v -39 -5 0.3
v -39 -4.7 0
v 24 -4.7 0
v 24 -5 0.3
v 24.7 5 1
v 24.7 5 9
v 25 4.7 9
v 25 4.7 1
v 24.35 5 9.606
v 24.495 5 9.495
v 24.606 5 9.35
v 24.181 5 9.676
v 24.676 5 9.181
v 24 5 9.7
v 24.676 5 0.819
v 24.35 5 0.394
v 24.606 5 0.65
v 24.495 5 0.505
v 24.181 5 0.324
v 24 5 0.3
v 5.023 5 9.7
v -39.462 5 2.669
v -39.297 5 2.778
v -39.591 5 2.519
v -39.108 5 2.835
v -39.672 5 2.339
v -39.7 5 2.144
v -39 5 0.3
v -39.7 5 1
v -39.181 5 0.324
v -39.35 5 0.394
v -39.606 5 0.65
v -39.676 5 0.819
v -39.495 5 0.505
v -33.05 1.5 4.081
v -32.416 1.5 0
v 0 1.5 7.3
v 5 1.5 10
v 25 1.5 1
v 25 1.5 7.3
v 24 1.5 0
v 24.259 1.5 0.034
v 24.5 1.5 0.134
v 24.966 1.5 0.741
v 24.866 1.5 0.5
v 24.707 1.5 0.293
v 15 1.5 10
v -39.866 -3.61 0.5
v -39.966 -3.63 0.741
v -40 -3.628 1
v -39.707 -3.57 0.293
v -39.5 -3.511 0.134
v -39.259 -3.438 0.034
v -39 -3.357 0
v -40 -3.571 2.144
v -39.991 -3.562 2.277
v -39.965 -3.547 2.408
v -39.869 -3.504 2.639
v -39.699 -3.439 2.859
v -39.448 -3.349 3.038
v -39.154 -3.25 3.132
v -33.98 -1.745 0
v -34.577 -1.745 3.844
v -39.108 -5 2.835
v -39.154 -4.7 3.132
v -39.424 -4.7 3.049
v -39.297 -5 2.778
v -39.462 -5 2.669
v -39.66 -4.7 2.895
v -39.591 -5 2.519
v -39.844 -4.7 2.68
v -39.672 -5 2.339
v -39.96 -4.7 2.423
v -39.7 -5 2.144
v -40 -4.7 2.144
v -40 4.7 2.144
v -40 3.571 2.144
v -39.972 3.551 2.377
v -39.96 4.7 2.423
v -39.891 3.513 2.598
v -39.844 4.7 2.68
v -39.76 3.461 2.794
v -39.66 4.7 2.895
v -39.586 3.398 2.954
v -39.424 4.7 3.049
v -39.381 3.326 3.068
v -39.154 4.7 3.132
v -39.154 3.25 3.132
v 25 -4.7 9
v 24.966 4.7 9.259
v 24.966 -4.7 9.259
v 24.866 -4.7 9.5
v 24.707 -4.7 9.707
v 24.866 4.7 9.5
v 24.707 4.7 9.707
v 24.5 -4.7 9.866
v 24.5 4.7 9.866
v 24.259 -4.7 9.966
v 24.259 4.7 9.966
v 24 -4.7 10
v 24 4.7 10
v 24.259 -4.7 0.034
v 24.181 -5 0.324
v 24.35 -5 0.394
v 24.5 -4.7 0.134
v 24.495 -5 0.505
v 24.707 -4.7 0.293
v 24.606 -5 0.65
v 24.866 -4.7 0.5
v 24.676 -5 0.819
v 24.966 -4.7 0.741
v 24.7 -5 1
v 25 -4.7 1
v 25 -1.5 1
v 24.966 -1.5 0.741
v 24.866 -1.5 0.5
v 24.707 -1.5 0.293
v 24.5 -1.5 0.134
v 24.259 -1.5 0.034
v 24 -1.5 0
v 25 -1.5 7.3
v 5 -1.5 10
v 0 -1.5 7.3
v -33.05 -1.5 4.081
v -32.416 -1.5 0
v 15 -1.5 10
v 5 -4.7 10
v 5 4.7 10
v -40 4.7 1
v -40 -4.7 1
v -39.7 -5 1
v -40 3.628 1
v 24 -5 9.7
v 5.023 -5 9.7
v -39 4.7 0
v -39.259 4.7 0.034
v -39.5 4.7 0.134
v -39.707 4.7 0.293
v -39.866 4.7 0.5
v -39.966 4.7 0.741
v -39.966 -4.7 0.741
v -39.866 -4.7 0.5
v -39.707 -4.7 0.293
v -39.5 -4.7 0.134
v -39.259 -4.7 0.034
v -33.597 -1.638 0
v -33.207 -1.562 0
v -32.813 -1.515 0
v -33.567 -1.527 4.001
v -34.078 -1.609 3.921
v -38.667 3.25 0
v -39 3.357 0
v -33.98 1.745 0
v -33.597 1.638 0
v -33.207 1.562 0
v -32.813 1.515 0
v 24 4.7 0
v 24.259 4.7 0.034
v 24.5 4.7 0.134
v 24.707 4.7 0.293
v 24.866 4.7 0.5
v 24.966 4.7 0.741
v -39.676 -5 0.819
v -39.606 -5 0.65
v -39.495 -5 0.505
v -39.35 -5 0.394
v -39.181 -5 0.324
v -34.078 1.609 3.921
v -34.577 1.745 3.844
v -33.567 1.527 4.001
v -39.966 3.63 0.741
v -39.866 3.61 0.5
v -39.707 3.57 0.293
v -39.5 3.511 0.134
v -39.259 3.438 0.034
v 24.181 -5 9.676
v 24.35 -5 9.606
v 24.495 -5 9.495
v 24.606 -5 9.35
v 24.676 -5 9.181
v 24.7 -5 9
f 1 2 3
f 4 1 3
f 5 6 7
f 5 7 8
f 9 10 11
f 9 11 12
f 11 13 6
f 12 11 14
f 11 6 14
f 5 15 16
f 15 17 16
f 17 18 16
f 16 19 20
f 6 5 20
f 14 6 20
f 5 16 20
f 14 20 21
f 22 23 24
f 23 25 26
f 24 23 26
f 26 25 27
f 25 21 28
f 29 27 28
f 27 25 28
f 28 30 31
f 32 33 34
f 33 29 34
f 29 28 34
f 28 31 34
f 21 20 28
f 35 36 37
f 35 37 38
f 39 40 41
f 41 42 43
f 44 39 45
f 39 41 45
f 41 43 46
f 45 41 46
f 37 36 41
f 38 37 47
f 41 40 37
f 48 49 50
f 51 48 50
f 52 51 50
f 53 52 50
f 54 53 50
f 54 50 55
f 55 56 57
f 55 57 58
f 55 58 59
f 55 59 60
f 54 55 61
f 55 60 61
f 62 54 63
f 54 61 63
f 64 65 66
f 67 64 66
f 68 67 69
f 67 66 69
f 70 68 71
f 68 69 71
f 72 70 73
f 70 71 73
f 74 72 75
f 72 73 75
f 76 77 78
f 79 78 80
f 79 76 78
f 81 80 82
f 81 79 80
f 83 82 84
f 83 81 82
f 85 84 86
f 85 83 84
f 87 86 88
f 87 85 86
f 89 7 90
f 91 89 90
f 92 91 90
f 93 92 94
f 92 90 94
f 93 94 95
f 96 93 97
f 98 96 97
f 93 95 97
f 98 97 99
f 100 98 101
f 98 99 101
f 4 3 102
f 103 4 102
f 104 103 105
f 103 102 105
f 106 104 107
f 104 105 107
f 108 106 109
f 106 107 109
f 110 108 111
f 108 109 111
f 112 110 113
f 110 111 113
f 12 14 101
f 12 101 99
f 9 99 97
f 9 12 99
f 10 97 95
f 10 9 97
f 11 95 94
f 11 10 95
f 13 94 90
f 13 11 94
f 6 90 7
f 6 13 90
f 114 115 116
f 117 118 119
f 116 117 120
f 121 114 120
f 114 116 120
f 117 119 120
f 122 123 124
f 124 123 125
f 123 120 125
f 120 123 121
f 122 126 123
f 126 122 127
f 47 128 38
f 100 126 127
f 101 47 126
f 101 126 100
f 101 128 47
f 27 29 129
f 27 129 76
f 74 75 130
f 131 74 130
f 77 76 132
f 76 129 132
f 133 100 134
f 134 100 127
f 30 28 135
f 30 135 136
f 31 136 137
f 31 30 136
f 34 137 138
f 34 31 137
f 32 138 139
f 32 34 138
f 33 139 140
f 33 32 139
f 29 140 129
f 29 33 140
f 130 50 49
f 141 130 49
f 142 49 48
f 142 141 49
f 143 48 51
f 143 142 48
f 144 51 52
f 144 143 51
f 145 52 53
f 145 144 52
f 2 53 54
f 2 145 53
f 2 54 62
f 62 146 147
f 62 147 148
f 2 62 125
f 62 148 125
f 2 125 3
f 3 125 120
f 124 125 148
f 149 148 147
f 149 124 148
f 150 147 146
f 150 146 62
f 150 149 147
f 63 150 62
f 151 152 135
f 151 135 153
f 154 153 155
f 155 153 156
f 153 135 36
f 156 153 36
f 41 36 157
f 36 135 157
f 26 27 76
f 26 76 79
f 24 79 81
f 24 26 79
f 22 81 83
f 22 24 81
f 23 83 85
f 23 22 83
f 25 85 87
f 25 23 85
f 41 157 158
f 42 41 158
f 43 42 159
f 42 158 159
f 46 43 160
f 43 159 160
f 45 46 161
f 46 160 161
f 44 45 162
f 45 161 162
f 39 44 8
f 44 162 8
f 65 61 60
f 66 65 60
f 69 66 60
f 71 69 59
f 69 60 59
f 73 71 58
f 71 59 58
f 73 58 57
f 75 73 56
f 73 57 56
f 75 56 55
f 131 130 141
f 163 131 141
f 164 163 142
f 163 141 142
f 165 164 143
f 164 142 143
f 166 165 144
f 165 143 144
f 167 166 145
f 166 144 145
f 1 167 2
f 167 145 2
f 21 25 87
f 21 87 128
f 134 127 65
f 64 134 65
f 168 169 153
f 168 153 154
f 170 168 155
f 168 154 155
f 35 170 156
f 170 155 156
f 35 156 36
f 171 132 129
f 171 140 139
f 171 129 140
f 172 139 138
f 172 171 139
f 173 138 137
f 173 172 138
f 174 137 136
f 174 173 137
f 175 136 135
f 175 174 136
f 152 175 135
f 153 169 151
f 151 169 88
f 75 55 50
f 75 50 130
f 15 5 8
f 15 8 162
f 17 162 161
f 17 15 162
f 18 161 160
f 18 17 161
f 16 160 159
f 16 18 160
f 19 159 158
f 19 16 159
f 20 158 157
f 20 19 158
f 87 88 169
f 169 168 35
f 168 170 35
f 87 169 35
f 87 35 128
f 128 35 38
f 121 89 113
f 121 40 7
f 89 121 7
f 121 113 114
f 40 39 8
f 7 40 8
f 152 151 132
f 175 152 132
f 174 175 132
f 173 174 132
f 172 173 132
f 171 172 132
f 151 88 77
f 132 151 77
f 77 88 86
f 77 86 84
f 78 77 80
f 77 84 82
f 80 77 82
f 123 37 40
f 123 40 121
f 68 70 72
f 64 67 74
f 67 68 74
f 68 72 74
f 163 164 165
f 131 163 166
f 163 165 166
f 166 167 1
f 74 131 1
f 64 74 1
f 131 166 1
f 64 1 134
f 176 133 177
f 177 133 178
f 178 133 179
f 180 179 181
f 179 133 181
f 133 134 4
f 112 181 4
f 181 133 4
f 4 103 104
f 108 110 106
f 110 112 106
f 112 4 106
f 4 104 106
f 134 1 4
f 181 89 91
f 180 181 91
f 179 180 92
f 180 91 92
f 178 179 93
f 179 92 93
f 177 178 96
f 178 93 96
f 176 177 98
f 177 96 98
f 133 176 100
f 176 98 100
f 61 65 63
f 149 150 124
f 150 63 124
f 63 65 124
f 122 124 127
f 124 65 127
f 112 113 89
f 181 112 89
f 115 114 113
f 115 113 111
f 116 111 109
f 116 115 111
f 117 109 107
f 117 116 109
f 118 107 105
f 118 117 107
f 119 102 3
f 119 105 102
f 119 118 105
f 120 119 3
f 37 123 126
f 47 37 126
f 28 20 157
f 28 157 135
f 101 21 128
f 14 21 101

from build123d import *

# Parameters (mm, degrees)
F1_DEPTH  = 10
F2_W      = 3
F2_H      = 7.3
F3_DEPTH  = 25.001
F5_DEPTH  = 10.001
F6_R      = 1
F8_DEPTH  = 1.5
F10_DEPTH = 25
F11_R     = 5
F12_SIZE  = 0.3


with BuildPart() as f1:
    # F0 (on Top) → F1 (new body)
    with BuildSketch(Plane.XY):
        Polygon((-40, 5), (-40, 1.5), (0, 1.5), (0, 0), (0, -1.5), (-40, -1.5), (-40, -5), (25, -5), (25, 0), (25, 5), align=None)
    extrude(amount=F1_DEPTH)

    # F2 (on face) → F3 (cut, through all)
    with BuildSketch(Plane(origin=(0, 0, 0), x_dir=(0, -1, 0), z_dir=(-1, 0, 0))):
        with Locations((0, 3.65)):
            Rectangle(F2_W, F2_H)
    extrude(amount=-F3_DEPTH, mode=Mode.SUBTRACT)

    # F4 (on face) → F5 (cut, through all)
    with BuildSketch(Plane.XZ.offset(5)):
        Polygon((-40, 10), (-40, 3), (5, 10), align=None)
    extrude(amount=-F5_DEPTH, mode=Mode.SUBTRACT)

    # F6
    f6_edges = [f1.edges().sort_by_distance(p)[0] for p in [
        (25, -3.25, 0),
        (25, 3.25, 0),
        (-40, -3.25, 0),
        (-40, 3.25, 0),
        (-40, -3.25, 3),
        (-40, 3.25, 3),
        (25, 0, 10),
    ]]
    fillet(f6_edges, radius=F6_R)

    # F7 (on Front) → F8 (cut, symmetric)
    with BuildSketch(Plane.XZ):
        Polygon((0, 10), (0, 7.3), (15, 10), align=None)
    extrude(amount=F8_DEPTH, both=True, mode=Mode.SUBTRACT)

    # F9 (on face) → F10 (cut)
    with BuildSketch(Plane(origin=(-1.4006750241, 0, 9.0043394407), x_dir=(0.988116469, 0, 0.1537070063), z_dir=(-0.1537070063, 0, 0.988116469))):
        Polygon((-28.2070668472, 0), (-38.2070668472, 3.25), (-47.1767681407, 6.1651529204), (-46.7135751583, -6.0146152011), (-38.2070668472, -3.25), align=None)
    extrude(amount=-F10_DEPTH, mode=Mode.SUBTRACT)

    # F11
    f11_edges = [f1.edges().sort_by_distance(p)[0] for p in [
        (-33.525134, 1.5, 1.979649),
        (-33.525134, -1.5, 1.979649),
    ]]
    fillet(f11_edges, radius=F11_R)

    # F12
    f12_edges = [f1.edges().sort_by_distance(p)[0] for p in [
        (-7.5, 5, 0),
        (24.707107, 5, 0.292893),
        (-39.707107, 5, 0.292893),
        (25, 5, 5),
        (-40, 5, 1.571765),
        (24.707107, 5, 9.707107),
        (-39.759509, 5, 2.794026),
        (14.5, 5, 10),
        (-17.076854, 5, 6.565823),
        (-7.5, -5, 0),
        (-39.707107, -5, 0.292893),
        (24.707107, -5, 0.292893),
        (-40, -5, 1.571765),
        (25, -5, 5),
        (-39.759509, -5, 2.794026),
        (24.707107, -5, 9.707107),
        (-17.076854, -5, 6.565823),
        (14.5, -5, 10),
    ]]
    chamfer(f12_edges, length=F12_SIZE)


solid = f1.part
